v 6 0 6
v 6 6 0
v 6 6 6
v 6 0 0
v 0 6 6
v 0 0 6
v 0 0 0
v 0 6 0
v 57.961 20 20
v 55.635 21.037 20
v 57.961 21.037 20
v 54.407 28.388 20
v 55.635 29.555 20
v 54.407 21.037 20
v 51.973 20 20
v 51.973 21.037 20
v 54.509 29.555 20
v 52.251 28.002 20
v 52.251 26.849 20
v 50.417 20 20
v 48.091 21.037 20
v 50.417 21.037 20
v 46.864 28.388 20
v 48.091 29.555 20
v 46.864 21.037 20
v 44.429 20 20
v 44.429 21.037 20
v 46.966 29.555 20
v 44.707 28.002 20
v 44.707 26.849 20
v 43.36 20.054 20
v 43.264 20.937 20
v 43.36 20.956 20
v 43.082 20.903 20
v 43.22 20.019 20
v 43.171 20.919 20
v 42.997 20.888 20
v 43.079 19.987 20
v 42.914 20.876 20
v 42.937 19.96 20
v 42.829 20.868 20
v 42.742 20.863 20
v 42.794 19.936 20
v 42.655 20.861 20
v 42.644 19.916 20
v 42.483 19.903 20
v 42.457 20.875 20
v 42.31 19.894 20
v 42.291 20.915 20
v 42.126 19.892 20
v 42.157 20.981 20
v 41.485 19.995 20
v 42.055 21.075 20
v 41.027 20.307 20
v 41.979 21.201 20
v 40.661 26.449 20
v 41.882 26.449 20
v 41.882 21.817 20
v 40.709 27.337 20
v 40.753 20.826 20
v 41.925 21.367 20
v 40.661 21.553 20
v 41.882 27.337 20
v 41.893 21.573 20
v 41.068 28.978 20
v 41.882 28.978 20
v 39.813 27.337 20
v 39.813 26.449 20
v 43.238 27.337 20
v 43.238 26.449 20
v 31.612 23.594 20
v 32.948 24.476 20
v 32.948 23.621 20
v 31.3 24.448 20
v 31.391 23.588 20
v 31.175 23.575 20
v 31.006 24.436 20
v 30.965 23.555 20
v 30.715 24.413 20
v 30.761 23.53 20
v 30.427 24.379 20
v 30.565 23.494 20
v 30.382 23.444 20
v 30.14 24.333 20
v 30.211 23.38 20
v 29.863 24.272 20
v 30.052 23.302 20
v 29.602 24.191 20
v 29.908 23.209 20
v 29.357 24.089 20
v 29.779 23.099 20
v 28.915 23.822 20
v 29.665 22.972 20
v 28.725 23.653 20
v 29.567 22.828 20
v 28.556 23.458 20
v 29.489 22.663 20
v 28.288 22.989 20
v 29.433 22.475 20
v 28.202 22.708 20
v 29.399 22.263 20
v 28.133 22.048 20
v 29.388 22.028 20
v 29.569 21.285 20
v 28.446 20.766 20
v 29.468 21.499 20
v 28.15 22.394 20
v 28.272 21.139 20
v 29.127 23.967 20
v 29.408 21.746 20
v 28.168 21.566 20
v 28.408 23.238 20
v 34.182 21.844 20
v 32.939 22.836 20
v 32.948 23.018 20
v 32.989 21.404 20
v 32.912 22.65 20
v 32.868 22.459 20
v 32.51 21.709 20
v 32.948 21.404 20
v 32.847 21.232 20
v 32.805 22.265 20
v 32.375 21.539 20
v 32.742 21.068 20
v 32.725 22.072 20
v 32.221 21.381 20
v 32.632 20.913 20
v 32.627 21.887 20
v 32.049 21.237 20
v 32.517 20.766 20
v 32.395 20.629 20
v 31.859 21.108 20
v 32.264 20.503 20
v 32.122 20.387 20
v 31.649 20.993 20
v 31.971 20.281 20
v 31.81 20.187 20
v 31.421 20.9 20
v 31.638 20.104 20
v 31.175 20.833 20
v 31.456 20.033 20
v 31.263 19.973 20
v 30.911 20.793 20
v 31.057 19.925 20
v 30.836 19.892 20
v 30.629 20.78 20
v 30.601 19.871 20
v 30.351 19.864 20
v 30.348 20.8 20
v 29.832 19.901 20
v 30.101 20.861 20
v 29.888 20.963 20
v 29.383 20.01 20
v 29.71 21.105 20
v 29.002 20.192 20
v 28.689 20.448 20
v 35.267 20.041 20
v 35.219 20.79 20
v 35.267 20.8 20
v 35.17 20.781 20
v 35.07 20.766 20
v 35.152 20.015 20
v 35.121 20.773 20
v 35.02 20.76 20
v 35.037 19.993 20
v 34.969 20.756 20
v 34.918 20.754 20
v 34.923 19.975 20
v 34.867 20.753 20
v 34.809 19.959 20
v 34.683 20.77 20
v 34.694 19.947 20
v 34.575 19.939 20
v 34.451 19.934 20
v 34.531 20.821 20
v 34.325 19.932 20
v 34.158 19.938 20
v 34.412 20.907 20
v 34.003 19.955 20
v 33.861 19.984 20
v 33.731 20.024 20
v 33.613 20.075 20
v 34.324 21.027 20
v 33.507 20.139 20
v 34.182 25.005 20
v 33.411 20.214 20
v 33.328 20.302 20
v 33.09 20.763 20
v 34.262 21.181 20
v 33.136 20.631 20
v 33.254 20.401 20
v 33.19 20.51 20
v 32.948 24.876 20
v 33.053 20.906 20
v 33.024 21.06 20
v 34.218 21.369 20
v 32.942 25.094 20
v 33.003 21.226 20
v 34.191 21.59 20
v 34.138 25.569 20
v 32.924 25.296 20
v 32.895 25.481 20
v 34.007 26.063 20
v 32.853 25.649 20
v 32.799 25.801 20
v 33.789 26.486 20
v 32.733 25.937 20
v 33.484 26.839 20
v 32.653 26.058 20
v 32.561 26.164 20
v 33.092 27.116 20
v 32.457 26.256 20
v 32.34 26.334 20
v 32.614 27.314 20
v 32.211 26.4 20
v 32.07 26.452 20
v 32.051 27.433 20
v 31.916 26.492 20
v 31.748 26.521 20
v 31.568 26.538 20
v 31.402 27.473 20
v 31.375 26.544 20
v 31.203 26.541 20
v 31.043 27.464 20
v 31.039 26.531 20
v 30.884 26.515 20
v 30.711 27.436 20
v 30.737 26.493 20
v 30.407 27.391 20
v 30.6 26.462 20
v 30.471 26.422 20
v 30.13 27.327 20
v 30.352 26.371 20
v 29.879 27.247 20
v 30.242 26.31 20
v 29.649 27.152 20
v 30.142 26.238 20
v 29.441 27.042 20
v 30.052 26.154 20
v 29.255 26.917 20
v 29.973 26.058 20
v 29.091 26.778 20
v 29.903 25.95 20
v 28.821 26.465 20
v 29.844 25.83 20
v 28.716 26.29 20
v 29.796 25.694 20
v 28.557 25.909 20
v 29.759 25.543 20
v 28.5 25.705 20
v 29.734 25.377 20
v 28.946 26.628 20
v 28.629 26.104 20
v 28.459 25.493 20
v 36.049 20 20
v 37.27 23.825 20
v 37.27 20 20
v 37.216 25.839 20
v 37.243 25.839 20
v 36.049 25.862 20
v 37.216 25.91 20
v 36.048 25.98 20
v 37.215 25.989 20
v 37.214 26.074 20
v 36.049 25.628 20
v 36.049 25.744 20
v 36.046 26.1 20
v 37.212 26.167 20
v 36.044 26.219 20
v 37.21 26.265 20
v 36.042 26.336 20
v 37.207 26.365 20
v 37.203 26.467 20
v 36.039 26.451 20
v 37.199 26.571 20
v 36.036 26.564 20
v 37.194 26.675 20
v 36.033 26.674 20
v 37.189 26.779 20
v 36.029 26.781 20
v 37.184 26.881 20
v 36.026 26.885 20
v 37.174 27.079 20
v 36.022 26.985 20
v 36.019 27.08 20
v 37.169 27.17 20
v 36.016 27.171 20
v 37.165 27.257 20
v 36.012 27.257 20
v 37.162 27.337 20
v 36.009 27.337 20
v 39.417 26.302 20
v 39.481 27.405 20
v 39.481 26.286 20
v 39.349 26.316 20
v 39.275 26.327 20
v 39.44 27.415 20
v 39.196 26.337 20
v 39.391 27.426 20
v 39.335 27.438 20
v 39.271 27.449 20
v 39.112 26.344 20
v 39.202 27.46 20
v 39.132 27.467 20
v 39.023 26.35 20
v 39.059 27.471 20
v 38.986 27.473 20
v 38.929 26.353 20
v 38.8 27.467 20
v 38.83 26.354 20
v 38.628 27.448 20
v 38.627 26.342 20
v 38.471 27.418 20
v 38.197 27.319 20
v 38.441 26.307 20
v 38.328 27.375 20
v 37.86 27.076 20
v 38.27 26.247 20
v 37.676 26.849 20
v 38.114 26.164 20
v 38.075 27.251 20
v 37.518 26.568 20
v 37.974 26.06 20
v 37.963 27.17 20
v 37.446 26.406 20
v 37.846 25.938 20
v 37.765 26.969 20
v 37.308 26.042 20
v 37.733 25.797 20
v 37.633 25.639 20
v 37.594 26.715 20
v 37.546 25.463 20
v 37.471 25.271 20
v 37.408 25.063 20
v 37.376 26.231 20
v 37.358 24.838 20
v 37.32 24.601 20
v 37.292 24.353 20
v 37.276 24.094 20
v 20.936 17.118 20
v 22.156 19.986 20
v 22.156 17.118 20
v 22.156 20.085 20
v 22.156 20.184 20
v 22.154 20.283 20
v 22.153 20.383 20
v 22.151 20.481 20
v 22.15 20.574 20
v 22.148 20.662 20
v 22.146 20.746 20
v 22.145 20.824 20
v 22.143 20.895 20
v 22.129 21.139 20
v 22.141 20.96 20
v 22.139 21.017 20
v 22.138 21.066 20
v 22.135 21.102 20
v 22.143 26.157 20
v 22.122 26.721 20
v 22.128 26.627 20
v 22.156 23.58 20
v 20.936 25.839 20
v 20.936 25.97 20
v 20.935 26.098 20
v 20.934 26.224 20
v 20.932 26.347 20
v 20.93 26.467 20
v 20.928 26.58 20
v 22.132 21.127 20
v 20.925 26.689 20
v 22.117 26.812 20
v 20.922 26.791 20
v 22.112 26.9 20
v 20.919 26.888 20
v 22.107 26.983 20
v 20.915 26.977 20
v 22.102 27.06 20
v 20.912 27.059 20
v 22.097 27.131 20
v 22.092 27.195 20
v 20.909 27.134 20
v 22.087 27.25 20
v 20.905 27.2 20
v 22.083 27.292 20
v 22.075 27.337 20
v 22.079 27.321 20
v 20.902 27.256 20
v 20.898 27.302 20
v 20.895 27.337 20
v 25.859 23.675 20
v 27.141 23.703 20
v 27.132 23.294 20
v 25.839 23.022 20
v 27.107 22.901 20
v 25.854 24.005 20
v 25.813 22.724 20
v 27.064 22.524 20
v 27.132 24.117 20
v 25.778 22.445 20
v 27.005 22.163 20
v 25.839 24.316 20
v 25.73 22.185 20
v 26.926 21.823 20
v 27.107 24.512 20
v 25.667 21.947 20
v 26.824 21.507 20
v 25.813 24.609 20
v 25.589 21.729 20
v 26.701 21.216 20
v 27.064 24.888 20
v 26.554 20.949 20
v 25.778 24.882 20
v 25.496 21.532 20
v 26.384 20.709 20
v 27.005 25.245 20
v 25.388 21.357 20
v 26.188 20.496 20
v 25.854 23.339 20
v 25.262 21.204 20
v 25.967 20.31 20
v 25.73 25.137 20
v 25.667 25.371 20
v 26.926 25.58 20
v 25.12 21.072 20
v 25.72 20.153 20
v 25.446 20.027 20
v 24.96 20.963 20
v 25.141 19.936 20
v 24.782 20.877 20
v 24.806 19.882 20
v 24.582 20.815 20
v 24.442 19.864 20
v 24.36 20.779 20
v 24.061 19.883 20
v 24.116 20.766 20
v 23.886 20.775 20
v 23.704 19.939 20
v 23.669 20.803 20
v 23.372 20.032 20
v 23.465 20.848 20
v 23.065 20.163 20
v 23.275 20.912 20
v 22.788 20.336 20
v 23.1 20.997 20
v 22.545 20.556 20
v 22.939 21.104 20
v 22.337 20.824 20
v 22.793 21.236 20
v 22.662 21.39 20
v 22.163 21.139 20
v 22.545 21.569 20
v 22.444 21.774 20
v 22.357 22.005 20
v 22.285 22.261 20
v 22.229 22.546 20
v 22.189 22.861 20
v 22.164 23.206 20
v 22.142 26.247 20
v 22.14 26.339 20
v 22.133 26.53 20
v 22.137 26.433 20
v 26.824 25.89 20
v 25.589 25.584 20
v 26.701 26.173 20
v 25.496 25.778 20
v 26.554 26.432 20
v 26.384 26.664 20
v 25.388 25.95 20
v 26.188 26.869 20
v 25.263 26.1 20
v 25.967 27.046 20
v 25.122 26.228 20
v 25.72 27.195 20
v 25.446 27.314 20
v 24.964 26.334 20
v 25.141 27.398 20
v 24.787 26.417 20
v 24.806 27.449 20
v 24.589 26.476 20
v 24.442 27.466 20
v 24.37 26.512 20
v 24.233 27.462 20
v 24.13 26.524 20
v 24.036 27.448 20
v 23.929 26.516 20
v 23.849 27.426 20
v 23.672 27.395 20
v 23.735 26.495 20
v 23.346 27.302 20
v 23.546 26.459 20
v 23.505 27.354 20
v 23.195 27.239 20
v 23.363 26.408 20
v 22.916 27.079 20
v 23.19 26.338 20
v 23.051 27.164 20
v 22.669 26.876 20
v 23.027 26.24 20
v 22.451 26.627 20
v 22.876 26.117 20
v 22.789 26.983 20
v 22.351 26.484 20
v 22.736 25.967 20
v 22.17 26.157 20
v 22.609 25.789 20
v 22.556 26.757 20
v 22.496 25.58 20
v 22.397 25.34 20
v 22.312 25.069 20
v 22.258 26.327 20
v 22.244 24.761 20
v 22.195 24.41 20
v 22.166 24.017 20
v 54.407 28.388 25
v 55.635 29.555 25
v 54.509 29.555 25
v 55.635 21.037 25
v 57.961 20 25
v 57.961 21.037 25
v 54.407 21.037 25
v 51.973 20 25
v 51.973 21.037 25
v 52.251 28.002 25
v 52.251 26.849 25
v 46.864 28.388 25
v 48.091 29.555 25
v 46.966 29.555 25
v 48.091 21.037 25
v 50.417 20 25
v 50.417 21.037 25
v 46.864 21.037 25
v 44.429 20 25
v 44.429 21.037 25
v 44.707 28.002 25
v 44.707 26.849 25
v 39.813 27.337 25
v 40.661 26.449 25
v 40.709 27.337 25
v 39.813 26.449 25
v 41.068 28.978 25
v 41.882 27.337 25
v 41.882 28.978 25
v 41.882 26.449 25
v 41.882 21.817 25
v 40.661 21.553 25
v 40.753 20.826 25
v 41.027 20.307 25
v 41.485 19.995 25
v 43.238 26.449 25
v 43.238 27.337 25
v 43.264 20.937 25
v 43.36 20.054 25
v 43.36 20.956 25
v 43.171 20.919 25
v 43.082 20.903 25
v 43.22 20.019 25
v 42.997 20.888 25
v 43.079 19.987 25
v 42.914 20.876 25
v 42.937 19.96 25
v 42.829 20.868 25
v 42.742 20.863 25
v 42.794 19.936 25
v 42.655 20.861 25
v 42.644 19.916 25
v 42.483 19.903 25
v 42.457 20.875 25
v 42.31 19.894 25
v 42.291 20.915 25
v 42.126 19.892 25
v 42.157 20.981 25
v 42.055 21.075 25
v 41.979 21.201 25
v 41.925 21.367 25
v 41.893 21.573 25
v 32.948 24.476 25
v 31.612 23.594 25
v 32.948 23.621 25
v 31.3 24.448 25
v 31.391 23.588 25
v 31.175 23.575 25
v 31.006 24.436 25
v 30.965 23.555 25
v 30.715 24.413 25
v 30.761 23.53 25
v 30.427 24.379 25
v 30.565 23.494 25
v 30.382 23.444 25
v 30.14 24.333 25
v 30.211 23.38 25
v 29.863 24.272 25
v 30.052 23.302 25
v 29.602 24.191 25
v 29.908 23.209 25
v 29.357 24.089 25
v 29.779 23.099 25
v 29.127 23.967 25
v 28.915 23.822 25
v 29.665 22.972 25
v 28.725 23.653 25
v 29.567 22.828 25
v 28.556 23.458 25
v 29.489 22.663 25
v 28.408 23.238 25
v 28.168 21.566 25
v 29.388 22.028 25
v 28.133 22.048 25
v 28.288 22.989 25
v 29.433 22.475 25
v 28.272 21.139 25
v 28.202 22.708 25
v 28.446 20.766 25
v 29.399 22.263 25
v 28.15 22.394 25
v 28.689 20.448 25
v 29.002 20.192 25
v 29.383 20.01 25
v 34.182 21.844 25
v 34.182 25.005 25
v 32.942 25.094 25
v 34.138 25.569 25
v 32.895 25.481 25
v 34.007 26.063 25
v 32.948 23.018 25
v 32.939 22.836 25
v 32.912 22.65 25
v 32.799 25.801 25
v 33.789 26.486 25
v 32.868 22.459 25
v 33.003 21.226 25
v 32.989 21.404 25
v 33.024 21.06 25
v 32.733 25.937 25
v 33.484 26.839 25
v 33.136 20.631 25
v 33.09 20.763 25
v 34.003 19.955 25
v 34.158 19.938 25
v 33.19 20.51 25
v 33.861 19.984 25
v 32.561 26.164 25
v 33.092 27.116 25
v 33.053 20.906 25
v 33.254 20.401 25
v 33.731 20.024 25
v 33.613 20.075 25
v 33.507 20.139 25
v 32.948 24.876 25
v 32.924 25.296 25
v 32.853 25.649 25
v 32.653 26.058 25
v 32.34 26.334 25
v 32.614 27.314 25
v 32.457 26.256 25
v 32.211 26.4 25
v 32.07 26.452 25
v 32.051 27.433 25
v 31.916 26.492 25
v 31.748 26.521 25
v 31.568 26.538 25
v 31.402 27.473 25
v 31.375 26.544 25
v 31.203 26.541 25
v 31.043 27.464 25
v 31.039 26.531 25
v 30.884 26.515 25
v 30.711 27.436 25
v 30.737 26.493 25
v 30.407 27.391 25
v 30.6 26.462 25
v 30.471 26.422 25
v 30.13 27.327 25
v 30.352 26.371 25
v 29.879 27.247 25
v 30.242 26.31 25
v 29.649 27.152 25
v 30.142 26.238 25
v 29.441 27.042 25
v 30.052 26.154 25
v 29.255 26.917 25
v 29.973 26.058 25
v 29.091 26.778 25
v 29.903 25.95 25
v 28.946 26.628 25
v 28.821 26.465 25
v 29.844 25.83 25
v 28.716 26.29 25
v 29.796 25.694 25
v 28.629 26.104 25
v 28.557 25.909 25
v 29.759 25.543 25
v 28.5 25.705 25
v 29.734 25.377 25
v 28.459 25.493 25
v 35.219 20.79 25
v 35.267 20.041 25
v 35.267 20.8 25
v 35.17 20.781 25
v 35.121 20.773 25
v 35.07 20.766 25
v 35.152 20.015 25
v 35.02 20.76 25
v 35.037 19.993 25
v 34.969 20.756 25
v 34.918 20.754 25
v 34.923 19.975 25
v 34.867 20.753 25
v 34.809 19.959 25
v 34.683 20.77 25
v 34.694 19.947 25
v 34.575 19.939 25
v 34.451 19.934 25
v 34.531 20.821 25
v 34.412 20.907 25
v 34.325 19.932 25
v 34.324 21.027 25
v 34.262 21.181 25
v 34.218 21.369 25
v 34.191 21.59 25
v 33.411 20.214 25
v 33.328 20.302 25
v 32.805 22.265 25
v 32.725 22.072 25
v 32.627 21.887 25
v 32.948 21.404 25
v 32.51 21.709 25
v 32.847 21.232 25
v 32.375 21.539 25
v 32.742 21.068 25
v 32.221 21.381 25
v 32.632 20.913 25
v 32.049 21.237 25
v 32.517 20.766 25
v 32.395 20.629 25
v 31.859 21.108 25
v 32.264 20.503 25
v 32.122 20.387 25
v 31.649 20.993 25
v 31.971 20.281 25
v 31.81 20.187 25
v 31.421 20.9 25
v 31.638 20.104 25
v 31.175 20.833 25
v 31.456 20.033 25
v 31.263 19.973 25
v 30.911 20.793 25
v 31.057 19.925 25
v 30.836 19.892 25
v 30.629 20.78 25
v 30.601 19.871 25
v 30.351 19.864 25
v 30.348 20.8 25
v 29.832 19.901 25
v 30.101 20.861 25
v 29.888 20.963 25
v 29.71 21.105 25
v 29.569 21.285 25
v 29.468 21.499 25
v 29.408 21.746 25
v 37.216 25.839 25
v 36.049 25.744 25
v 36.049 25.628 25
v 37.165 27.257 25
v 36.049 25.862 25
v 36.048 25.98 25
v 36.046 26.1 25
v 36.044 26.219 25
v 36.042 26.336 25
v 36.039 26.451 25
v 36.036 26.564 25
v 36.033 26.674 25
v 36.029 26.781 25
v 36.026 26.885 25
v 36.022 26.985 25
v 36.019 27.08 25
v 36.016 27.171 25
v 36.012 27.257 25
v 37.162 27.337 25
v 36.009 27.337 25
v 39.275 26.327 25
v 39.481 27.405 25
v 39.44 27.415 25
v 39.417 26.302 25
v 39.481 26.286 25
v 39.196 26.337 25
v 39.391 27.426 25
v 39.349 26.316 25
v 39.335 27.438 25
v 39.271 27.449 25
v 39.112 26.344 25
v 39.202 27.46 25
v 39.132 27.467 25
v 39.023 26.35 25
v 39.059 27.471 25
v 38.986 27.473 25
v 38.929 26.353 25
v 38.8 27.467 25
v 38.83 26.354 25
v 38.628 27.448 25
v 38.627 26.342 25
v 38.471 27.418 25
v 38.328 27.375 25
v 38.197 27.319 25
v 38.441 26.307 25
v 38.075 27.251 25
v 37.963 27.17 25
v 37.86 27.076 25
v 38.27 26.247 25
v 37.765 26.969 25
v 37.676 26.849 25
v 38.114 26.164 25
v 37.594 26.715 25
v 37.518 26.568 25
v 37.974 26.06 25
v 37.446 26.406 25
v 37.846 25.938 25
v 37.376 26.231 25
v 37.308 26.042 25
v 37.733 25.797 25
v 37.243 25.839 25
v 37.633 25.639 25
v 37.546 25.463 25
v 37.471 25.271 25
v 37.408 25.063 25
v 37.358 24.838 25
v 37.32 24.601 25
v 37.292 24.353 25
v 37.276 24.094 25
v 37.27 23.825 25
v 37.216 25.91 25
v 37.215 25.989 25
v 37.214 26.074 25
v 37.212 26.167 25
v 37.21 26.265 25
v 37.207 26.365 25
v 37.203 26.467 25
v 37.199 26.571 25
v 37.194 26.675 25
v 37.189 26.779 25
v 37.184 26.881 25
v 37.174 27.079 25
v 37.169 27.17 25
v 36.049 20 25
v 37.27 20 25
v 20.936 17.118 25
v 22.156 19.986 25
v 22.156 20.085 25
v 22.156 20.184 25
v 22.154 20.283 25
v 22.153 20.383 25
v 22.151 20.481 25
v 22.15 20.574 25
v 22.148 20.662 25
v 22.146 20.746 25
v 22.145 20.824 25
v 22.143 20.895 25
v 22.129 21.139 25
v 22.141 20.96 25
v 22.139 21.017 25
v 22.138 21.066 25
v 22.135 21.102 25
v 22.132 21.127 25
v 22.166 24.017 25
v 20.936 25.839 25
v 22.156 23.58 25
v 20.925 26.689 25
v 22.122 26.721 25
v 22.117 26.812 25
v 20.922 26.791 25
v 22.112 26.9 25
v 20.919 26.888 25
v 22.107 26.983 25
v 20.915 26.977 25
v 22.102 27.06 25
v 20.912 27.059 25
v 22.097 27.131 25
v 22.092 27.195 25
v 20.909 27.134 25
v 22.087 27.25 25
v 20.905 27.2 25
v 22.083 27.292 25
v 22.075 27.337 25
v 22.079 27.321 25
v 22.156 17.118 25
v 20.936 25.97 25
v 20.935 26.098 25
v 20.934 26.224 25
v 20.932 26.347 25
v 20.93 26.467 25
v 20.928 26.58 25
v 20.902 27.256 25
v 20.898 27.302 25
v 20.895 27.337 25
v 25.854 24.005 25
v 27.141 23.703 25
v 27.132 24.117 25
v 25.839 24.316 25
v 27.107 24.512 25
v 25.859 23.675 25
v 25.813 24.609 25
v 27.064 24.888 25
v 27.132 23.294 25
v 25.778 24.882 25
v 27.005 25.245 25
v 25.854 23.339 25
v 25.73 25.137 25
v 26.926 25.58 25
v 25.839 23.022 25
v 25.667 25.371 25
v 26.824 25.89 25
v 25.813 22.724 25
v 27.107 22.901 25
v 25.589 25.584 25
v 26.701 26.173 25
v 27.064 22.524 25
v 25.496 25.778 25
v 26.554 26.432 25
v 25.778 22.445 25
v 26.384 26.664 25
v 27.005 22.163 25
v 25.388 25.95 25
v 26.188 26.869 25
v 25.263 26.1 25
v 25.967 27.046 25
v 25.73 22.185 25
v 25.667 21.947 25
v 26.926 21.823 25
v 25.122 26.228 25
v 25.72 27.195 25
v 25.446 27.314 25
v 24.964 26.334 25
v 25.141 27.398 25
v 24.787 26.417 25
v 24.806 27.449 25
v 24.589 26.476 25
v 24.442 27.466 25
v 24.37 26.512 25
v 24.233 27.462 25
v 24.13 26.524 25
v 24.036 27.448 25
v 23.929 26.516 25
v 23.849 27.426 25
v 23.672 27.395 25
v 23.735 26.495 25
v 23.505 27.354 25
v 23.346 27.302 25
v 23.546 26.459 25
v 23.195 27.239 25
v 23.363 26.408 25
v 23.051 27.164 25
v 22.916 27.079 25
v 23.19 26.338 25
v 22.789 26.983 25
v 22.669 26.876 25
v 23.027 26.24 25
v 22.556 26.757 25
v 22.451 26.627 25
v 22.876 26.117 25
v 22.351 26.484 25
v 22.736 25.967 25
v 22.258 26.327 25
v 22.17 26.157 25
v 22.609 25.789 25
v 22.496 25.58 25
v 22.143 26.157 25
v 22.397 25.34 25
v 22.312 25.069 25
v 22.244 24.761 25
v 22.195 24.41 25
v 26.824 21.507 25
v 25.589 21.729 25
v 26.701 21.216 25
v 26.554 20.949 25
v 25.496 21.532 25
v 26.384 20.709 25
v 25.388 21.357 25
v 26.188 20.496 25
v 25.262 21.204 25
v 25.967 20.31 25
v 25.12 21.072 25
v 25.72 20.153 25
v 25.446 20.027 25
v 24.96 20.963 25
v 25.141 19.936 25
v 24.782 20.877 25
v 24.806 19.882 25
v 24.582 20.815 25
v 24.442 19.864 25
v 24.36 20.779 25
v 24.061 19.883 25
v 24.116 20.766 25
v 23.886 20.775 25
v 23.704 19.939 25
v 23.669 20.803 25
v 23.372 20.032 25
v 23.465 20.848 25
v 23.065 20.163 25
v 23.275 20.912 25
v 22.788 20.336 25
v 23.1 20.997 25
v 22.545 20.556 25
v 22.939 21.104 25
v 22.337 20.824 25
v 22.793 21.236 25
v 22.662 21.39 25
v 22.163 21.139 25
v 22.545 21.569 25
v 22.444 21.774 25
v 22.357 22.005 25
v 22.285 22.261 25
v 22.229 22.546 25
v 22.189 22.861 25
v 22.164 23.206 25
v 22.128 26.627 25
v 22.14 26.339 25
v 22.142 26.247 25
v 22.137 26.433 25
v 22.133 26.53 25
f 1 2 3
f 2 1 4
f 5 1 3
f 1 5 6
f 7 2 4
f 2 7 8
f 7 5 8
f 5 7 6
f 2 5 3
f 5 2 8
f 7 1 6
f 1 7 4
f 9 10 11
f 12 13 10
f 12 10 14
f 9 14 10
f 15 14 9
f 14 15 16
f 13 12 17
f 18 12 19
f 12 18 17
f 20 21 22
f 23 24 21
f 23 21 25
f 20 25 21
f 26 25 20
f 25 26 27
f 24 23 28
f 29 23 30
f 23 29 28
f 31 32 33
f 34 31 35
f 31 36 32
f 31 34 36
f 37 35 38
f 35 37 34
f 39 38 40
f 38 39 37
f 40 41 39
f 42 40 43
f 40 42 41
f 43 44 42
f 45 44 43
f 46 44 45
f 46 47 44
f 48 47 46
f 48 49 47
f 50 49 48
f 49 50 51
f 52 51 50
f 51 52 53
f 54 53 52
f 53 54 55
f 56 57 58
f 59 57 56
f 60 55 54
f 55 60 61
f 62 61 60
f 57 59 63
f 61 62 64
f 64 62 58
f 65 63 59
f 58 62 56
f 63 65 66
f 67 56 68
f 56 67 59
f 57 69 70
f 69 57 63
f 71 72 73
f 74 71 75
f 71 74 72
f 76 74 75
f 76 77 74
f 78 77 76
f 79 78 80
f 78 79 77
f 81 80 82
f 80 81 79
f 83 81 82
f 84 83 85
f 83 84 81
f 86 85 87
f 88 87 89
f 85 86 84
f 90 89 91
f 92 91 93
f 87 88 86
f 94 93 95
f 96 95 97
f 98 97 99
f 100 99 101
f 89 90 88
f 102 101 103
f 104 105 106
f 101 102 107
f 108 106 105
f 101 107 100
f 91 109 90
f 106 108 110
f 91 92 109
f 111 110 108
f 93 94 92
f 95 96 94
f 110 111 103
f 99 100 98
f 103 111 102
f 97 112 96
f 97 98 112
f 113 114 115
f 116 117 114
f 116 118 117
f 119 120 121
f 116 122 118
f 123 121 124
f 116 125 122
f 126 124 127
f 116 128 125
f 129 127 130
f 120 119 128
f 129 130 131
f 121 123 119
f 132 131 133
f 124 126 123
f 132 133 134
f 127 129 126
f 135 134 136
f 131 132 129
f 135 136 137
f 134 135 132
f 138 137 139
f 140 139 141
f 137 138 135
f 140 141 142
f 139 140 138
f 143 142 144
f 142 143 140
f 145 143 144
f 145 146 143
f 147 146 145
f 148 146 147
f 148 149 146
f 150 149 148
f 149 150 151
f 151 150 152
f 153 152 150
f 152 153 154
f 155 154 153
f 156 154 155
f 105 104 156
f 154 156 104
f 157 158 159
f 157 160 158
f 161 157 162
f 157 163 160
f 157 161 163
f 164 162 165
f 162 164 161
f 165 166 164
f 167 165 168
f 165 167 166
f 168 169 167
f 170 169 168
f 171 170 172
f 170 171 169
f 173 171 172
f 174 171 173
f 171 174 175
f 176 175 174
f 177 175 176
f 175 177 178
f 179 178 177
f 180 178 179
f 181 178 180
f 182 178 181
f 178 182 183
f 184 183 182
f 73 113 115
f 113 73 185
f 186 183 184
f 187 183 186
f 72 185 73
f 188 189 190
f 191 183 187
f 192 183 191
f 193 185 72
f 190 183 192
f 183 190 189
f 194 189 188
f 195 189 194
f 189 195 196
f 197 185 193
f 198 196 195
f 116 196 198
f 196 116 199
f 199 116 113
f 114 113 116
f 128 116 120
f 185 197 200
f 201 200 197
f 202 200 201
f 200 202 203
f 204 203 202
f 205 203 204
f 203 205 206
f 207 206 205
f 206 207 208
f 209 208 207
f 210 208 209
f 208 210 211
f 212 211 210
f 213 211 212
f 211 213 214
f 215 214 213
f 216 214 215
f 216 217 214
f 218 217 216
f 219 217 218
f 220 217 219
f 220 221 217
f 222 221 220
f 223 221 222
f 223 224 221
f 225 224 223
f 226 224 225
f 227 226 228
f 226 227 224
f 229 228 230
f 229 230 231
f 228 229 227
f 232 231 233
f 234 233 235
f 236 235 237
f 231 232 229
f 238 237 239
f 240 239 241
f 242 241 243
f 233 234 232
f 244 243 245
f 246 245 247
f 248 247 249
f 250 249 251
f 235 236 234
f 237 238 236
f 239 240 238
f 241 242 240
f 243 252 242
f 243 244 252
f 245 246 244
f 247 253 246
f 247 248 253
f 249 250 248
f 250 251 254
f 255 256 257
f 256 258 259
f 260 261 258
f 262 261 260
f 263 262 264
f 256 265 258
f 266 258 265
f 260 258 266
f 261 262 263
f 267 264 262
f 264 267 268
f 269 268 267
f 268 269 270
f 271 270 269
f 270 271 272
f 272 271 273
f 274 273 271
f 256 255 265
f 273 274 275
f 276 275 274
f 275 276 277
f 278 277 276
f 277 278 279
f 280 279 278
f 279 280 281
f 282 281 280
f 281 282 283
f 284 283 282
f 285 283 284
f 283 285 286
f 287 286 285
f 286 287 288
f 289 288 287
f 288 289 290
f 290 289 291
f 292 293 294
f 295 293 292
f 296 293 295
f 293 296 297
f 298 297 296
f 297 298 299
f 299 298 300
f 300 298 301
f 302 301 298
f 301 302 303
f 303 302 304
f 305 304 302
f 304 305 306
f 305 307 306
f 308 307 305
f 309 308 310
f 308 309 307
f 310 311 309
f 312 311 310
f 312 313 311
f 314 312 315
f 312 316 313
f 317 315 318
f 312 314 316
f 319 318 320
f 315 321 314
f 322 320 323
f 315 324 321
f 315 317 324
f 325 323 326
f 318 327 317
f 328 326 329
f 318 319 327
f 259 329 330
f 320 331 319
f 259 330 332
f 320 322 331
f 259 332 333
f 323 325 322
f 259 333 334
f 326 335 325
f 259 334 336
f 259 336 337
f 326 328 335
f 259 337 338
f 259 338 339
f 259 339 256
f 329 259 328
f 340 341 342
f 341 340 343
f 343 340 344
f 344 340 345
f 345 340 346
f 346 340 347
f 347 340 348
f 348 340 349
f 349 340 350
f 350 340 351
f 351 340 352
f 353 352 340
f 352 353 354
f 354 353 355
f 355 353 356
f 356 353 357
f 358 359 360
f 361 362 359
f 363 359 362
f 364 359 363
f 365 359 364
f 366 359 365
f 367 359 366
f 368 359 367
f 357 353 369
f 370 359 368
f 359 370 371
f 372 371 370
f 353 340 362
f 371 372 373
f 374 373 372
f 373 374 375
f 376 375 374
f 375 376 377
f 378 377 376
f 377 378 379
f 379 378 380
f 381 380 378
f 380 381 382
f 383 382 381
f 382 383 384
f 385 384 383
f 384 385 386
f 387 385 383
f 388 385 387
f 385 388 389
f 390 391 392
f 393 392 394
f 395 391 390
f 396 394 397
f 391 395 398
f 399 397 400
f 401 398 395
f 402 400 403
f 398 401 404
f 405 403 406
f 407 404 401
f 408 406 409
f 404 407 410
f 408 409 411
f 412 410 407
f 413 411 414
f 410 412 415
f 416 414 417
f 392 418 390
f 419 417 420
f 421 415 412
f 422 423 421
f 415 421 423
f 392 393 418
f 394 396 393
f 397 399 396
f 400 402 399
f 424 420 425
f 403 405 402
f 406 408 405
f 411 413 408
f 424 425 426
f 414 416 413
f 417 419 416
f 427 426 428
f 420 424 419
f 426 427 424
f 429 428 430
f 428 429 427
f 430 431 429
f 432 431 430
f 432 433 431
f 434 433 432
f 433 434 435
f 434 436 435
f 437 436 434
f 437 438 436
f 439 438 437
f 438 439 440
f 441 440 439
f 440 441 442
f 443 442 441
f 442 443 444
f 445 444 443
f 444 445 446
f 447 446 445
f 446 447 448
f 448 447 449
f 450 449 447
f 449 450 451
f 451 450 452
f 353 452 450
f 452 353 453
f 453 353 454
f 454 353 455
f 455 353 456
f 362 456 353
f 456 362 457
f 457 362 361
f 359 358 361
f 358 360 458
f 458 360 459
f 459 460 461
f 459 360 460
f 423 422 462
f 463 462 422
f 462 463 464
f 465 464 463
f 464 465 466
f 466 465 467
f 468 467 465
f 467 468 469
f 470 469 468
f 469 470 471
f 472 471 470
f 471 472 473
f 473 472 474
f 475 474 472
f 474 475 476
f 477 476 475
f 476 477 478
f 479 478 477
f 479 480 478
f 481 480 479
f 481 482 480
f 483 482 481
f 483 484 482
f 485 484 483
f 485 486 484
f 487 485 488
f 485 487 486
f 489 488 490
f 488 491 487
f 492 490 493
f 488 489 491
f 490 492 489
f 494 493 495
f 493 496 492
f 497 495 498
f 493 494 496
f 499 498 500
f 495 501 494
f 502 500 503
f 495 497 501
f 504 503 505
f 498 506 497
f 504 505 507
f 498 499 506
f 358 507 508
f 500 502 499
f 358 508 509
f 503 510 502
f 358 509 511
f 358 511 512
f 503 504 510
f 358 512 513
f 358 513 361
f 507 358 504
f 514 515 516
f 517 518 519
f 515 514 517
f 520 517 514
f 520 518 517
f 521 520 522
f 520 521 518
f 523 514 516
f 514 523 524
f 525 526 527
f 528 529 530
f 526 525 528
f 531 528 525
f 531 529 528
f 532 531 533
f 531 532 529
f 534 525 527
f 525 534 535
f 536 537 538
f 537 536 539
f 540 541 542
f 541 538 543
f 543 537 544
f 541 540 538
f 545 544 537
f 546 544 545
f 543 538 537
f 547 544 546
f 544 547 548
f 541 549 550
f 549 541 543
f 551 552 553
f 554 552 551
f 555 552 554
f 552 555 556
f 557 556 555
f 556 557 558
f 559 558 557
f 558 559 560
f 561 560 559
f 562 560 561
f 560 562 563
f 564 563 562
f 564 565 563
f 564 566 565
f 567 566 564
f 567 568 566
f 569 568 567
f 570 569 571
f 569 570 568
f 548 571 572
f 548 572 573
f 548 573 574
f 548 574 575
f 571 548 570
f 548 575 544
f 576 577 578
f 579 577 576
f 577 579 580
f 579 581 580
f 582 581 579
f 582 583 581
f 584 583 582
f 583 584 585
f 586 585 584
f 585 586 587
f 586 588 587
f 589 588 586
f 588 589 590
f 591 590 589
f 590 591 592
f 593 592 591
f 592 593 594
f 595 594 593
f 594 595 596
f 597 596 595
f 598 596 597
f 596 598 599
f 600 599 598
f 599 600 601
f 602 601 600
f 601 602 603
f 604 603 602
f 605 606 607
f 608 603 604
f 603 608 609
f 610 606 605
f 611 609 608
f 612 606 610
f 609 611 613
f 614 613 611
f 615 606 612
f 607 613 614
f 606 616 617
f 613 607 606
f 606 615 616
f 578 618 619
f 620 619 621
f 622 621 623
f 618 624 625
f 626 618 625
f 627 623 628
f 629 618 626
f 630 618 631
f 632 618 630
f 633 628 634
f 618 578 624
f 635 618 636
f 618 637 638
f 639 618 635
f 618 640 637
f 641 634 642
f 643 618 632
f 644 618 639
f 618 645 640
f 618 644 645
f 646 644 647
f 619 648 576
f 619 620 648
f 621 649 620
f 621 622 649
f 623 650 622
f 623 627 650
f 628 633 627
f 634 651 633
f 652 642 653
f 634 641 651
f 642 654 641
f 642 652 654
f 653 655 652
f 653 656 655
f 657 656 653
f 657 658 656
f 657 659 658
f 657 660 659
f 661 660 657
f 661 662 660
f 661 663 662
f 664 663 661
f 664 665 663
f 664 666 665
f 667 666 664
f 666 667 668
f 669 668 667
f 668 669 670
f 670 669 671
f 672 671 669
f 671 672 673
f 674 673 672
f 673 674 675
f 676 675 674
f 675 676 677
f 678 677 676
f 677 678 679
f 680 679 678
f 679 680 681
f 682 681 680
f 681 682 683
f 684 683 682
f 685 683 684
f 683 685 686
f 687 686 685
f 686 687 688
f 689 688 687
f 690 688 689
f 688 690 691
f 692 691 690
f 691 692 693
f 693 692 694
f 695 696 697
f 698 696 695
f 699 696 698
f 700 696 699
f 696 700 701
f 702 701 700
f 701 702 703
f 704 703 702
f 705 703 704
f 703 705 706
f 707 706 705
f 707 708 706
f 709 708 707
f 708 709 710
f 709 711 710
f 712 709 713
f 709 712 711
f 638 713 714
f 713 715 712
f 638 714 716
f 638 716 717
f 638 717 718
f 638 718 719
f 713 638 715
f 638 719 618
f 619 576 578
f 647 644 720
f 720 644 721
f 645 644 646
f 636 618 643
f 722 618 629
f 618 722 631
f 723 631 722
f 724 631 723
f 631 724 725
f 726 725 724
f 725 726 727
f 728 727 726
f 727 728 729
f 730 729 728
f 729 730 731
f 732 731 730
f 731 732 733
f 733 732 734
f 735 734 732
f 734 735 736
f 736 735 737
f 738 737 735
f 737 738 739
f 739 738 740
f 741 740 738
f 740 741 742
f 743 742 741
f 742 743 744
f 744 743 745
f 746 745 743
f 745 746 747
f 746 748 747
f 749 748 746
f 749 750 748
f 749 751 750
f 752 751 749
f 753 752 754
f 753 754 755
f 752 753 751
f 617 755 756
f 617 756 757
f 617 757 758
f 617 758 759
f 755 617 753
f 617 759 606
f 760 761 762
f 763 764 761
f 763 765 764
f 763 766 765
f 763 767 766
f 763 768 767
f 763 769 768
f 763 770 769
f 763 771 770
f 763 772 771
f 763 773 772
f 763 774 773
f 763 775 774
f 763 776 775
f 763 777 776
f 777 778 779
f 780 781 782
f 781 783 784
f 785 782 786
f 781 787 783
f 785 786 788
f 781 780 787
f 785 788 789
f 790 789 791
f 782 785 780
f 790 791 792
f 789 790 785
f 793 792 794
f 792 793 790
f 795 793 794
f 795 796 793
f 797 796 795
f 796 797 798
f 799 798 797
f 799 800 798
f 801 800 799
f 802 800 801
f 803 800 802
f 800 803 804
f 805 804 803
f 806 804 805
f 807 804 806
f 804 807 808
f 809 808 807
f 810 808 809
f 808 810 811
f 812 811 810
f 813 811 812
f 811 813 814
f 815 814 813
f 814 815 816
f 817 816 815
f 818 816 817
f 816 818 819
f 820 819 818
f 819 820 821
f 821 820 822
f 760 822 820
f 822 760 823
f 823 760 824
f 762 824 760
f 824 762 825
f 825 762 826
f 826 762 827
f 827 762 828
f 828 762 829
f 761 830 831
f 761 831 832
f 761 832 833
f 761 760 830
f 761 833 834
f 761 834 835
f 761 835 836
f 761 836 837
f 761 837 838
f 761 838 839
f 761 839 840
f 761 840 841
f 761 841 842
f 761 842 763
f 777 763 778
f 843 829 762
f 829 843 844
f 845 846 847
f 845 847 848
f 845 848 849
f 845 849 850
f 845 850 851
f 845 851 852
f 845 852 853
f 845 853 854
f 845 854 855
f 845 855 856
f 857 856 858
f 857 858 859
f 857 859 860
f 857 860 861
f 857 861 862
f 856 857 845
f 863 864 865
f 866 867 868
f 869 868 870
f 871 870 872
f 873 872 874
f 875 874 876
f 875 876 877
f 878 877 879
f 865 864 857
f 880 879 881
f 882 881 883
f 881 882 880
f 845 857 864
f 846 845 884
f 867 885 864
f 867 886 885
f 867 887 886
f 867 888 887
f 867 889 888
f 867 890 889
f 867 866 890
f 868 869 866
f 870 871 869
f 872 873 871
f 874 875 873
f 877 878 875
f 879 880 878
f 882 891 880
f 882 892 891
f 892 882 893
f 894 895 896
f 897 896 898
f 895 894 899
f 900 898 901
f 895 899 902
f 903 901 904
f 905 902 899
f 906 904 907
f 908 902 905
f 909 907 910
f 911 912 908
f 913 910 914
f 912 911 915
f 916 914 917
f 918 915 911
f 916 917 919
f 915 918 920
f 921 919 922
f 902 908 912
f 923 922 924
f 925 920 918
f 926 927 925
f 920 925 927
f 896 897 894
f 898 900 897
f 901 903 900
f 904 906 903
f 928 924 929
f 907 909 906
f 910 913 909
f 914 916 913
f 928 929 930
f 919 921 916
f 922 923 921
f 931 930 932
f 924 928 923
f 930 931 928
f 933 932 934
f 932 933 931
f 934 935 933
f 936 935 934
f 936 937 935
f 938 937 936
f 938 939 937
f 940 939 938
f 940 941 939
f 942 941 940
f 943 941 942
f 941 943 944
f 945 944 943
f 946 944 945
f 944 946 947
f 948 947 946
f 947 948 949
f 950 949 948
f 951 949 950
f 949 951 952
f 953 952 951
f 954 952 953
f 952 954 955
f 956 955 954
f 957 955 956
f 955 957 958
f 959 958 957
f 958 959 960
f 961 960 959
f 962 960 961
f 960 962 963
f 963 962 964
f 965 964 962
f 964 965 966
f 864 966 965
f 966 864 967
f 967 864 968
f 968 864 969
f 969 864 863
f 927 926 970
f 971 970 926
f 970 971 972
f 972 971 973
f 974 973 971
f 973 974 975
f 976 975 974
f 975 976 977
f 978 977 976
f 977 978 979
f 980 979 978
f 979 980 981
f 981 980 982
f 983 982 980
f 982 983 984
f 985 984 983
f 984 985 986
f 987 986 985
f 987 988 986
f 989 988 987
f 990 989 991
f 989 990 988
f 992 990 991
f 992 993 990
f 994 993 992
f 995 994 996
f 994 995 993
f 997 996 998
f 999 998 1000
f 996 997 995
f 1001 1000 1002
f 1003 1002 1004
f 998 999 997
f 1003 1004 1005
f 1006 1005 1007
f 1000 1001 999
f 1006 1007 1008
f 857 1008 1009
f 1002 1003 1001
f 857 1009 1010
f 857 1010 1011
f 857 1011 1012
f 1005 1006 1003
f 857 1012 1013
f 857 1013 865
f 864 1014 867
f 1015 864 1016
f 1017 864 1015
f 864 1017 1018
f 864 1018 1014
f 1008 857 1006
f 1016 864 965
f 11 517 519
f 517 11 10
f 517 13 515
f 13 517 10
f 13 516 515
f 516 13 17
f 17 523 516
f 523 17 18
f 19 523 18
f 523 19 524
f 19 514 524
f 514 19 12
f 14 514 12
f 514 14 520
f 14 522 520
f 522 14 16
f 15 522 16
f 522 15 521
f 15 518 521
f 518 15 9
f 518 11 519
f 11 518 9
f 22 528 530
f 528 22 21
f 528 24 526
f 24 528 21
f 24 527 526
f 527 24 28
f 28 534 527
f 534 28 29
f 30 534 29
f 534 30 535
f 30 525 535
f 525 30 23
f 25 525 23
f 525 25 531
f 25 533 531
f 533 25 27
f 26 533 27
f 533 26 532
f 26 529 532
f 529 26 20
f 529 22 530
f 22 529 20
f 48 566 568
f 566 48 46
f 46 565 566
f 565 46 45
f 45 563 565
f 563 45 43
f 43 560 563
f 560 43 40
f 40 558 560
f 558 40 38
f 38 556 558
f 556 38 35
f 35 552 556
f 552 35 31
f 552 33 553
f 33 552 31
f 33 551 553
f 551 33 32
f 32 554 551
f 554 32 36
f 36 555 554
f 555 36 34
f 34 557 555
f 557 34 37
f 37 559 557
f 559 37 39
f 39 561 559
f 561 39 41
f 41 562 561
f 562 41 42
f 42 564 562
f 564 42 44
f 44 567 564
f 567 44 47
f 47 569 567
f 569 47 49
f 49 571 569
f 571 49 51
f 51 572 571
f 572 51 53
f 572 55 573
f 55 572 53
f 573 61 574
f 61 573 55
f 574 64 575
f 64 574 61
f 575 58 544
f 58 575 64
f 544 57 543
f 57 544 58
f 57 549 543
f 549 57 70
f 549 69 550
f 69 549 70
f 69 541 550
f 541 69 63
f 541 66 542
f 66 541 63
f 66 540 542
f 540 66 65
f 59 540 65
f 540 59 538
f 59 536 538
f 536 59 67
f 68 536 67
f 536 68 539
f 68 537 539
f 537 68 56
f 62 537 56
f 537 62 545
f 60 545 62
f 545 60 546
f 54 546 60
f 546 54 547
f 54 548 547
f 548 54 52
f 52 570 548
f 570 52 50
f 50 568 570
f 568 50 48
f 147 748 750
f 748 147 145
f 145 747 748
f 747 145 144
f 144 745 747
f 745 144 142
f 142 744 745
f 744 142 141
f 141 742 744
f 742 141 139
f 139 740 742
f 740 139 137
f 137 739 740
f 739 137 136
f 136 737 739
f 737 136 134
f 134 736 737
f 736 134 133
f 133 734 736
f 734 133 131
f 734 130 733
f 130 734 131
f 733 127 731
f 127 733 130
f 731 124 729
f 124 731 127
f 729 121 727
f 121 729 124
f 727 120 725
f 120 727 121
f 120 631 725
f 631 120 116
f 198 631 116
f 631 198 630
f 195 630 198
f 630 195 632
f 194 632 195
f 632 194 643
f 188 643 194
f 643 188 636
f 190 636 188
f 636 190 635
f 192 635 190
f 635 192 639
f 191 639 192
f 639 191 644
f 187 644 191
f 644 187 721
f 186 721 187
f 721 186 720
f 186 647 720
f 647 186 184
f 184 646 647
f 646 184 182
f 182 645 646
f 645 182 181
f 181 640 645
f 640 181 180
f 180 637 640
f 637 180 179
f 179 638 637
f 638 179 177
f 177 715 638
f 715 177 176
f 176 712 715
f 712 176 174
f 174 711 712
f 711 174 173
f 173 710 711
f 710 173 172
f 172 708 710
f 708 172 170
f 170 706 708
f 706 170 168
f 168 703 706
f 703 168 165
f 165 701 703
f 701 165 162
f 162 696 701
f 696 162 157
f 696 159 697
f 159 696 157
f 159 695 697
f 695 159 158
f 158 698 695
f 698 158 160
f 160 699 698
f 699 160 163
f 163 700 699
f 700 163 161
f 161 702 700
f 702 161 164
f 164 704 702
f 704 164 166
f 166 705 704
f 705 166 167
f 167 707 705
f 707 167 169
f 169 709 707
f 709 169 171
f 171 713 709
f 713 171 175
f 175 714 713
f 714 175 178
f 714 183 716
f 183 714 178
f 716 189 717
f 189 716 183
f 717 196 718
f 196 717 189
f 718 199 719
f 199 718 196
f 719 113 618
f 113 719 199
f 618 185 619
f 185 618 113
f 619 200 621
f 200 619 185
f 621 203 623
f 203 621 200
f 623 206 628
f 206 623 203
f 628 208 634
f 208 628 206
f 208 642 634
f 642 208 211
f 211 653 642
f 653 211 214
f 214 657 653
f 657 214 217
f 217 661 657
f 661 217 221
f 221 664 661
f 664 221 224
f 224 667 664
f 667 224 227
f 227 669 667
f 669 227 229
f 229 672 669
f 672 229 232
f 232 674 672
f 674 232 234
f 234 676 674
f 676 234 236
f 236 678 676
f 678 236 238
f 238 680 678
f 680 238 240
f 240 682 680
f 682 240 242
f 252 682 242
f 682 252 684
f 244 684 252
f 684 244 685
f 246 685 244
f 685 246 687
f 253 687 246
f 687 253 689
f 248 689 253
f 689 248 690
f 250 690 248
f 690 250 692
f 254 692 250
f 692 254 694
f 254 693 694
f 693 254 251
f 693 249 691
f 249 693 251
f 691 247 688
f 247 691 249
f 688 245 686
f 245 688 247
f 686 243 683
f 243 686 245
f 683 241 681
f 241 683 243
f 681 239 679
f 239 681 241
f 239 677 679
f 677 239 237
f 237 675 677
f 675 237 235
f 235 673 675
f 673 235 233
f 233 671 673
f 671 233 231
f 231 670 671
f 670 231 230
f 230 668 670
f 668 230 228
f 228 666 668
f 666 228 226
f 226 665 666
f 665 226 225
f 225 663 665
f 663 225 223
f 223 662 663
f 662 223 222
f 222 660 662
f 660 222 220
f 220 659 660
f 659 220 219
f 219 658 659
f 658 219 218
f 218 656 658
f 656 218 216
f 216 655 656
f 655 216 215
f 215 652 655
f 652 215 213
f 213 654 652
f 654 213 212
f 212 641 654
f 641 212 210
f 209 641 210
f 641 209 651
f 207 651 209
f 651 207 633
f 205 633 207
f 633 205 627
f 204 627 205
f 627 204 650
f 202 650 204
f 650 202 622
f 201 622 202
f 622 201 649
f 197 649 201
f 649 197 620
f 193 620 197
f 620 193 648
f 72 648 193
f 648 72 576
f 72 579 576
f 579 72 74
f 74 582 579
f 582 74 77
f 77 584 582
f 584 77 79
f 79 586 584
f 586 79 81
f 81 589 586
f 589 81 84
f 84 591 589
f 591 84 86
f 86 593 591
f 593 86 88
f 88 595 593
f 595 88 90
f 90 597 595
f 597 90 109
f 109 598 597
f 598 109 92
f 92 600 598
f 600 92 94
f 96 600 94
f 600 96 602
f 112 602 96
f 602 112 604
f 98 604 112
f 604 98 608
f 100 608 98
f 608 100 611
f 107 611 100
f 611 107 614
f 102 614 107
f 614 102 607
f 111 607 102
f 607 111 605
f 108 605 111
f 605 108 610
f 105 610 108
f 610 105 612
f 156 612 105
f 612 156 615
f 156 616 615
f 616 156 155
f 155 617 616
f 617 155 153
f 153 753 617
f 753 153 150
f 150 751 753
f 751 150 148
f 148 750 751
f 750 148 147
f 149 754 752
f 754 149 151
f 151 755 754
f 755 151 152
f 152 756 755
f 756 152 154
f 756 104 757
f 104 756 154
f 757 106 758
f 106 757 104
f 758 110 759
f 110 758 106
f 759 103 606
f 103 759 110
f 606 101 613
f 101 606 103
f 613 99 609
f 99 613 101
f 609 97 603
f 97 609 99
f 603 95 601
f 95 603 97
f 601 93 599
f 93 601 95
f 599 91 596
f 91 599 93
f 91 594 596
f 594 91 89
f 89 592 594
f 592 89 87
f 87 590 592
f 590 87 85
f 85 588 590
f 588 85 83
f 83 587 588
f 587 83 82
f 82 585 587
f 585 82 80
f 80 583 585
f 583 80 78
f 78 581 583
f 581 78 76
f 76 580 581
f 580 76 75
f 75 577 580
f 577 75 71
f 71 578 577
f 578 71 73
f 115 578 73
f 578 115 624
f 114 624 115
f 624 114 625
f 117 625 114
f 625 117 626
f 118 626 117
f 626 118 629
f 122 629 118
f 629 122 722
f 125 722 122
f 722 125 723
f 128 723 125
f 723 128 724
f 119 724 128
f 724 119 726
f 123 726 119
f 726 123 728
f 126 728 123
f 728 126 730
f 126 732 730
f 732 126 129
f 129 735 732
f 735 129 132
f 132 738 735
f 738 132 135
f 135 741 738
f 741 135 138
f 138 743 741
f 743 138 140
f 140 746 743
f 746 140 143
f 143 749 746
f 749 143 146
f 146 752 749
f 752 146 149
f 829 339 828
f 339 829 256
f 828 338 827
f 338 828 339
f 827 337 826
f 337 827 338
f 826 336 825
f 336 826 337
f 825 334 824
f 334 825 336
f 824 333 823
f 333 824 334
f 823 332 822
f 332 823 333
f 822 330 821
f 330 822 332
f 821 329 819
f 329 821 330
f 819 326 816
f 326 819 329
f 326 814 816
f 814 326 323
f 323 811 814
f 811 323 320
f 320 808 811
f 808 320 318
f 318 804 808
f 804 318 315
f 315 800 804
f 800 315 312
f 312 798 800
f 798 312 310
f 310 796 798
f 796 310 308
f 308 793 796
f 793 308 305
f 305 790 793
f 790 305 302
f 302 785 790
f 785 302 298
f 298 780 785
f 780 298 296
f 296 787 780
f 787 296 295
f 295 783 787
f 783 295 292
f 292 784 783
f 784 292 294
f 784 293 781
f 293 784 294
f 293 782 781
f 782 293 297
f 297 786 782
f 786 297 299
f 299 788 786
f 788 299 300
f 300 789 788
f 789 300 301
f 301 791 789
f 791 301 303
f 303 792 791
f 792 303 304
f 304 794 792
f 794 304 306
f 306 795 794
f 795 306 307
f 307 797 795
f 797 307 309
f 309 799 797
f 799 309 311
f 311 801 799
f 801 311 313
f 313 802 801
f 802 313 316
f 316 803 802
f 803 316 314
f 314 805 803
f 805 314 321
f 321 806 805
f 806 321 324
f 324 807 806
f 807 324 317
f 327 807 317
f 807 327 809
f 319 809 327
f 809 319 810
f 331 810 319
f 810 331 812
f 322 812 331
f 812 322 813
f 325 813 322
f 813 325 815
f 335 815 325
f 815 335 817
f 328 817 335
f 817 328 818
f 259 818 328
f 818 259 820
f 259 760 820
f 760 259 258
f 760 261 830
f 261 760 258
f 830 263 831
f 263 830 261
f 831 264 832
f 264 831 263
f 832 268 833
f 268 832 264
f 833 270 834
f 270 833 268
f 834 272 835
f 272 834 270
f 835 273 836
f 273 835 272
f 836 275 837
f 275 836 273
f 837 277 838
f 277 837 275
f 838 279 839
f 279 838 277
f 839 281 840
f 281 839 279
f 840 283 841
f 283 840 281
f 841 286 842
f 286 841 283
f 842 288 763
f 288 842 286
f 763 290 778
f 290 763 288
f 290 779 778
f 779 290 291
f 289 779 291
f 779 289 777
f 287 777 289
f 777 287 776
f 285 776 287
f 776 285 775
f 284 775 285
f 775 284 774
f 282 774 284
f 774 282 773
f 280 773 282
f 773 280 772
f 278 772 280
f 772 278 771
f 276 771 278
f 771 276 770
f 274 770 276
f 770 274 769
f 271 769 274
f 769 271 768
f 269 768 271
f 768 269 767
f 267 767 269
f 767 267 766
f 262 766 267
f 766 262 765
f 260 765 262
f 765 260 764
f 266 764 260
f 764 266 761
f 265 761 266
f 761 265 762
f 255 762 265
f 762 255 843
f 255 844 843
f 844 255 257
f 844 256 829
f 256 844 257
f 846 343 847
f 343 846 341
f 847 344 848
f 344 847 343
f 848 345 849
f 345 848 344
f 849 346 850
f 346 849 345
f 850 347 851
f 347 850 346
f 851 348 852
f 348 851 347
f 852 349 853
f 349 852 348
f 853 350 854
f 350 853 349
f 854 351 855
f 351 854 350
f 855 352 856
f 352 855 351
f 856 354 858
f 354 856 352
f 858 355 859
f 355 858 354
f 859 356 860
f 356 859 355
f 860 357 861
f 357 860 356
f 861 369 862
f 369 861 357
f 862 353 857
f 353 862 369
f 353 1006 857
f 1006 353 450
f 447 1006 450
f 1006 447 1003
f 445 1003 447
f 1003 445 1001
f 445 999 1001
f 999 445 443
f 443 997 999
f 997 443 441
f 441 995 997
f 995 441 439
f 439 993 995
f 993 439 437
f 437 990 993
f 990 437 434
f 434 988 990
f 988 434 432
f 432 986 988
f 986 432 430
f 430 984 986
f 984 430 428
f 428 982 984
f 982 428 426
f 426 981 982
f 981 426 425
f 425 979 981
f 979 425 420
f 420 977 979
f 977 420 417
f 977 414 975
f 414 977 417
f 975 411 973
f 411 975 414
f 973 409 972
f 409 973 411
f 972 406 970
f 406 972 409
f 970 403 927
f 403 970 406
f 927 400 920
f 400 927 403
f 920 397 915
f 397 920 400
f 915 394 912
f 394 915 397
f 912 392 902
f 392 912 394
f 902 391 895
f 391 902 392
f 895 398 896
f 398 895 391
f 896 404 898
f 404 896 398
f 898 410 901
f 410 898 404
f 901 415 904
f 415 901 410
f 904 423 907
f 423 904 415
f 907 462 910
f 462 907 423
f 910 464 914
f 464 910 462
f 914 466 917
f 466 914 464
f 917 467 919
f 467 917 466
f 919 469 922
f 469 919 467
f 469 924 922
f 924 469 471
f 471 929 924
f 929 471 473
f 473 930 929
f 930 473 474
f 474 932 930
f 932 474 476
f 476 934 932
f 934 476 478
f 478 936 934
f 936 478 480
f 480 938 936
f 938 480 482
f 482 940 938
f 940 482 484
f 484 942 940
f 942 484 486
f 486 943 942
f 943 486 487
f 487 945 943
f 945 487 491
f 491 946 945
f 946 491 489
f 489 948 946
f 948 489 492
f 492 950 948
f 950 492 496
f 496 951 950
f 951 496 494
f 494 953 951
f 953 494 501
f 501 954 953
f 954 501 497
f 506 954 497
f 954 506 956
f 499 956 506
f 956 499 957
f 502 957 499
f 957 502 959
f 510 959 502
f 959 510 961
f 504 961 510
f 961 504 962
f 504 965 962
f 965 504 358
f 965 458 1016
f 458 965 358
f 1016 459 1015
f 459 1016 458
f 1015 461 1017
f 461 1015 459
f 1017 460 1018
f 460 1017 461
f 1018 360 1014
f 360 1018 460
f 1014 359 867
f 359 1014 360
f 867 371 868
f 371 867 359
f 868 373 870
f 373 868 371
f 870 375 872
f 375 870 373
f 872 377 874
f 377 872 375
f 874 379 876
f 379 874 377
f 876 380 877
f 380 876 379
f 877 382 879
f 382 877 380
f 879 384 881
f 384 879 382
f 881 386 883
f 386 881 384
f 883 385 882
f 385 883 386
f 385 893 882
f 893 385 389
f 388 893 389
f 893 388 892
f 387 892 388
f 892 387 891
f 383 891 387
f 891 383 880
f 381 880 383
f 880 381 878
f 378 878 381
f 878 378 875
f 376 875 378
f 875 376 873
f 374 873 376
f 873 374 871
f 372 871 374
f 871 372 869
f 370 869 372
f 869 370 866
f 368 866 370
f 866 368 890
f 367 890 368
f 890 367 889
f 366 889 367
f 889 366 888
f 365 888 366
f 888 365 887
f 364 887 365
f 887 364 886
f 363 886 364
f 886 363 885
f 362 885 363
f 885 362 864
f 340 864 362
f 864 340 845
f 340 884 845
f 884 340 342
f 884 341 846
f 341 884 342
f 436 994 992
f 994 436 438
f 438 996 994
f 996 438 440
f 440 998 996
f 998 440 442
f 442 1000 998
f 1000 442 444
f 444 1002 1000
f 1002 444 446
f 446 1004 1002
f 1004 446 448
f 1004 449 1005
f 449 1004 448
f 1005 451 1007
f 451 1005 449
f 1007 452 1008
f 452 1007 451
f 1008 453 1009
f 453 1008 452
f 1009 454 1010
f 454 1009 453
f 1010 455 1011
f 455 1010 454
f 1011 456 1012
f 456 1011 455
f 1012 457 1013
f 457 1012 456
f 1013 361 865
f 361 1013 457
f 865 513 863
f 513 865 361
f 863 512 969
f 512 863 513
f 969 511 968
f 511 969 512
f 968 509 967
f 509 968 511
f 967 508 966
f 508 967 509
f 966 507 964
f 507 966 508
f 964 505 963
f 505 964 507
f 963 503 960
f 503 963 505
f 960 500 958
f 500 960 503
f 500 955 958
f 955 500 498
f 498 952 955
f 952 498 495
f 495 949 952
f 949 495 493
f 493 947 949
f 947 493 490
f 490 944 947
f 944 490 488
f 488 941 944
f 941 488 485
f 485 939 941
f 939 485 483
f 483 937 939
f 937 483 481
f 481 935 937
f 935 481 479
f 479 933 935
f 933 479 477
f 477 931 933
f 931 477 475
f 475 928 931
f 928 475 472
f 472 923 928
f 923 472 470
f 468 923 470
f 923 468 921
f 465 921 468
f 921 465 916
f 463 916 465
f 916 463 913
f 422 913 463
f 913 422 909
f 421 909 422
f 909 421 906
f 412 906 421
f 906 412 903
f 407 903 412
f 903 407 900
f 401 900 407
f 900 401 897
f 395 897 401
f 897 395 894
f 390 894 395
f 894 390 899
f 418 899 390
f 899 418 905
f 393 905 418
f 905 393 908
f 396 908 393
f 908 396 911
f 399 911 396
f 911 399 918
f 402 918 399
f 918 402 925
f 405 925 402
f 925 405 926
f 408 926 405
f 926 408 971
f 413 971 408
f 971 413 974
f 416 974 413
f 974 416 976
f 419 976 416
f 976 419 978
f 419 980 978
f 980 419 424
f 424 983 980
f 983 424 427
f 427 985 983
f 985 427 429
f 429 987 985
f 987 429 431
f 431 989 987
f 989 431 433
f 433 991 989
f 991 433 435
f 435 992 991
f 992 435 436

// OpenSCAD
//[CUSTOMIZATION]
// X Dimension
xdim=6;
// Y Dimension
ydim=12;
// Z Dimension
zdim=11;
// Message
txt="part11";
module __END_CUSTOMIZATIONS () {}
cube(xdim,ydim,zdim);
translate([20,20,20]) { linear_extrude(5) text(txt, font="Liberation Sans"); }
